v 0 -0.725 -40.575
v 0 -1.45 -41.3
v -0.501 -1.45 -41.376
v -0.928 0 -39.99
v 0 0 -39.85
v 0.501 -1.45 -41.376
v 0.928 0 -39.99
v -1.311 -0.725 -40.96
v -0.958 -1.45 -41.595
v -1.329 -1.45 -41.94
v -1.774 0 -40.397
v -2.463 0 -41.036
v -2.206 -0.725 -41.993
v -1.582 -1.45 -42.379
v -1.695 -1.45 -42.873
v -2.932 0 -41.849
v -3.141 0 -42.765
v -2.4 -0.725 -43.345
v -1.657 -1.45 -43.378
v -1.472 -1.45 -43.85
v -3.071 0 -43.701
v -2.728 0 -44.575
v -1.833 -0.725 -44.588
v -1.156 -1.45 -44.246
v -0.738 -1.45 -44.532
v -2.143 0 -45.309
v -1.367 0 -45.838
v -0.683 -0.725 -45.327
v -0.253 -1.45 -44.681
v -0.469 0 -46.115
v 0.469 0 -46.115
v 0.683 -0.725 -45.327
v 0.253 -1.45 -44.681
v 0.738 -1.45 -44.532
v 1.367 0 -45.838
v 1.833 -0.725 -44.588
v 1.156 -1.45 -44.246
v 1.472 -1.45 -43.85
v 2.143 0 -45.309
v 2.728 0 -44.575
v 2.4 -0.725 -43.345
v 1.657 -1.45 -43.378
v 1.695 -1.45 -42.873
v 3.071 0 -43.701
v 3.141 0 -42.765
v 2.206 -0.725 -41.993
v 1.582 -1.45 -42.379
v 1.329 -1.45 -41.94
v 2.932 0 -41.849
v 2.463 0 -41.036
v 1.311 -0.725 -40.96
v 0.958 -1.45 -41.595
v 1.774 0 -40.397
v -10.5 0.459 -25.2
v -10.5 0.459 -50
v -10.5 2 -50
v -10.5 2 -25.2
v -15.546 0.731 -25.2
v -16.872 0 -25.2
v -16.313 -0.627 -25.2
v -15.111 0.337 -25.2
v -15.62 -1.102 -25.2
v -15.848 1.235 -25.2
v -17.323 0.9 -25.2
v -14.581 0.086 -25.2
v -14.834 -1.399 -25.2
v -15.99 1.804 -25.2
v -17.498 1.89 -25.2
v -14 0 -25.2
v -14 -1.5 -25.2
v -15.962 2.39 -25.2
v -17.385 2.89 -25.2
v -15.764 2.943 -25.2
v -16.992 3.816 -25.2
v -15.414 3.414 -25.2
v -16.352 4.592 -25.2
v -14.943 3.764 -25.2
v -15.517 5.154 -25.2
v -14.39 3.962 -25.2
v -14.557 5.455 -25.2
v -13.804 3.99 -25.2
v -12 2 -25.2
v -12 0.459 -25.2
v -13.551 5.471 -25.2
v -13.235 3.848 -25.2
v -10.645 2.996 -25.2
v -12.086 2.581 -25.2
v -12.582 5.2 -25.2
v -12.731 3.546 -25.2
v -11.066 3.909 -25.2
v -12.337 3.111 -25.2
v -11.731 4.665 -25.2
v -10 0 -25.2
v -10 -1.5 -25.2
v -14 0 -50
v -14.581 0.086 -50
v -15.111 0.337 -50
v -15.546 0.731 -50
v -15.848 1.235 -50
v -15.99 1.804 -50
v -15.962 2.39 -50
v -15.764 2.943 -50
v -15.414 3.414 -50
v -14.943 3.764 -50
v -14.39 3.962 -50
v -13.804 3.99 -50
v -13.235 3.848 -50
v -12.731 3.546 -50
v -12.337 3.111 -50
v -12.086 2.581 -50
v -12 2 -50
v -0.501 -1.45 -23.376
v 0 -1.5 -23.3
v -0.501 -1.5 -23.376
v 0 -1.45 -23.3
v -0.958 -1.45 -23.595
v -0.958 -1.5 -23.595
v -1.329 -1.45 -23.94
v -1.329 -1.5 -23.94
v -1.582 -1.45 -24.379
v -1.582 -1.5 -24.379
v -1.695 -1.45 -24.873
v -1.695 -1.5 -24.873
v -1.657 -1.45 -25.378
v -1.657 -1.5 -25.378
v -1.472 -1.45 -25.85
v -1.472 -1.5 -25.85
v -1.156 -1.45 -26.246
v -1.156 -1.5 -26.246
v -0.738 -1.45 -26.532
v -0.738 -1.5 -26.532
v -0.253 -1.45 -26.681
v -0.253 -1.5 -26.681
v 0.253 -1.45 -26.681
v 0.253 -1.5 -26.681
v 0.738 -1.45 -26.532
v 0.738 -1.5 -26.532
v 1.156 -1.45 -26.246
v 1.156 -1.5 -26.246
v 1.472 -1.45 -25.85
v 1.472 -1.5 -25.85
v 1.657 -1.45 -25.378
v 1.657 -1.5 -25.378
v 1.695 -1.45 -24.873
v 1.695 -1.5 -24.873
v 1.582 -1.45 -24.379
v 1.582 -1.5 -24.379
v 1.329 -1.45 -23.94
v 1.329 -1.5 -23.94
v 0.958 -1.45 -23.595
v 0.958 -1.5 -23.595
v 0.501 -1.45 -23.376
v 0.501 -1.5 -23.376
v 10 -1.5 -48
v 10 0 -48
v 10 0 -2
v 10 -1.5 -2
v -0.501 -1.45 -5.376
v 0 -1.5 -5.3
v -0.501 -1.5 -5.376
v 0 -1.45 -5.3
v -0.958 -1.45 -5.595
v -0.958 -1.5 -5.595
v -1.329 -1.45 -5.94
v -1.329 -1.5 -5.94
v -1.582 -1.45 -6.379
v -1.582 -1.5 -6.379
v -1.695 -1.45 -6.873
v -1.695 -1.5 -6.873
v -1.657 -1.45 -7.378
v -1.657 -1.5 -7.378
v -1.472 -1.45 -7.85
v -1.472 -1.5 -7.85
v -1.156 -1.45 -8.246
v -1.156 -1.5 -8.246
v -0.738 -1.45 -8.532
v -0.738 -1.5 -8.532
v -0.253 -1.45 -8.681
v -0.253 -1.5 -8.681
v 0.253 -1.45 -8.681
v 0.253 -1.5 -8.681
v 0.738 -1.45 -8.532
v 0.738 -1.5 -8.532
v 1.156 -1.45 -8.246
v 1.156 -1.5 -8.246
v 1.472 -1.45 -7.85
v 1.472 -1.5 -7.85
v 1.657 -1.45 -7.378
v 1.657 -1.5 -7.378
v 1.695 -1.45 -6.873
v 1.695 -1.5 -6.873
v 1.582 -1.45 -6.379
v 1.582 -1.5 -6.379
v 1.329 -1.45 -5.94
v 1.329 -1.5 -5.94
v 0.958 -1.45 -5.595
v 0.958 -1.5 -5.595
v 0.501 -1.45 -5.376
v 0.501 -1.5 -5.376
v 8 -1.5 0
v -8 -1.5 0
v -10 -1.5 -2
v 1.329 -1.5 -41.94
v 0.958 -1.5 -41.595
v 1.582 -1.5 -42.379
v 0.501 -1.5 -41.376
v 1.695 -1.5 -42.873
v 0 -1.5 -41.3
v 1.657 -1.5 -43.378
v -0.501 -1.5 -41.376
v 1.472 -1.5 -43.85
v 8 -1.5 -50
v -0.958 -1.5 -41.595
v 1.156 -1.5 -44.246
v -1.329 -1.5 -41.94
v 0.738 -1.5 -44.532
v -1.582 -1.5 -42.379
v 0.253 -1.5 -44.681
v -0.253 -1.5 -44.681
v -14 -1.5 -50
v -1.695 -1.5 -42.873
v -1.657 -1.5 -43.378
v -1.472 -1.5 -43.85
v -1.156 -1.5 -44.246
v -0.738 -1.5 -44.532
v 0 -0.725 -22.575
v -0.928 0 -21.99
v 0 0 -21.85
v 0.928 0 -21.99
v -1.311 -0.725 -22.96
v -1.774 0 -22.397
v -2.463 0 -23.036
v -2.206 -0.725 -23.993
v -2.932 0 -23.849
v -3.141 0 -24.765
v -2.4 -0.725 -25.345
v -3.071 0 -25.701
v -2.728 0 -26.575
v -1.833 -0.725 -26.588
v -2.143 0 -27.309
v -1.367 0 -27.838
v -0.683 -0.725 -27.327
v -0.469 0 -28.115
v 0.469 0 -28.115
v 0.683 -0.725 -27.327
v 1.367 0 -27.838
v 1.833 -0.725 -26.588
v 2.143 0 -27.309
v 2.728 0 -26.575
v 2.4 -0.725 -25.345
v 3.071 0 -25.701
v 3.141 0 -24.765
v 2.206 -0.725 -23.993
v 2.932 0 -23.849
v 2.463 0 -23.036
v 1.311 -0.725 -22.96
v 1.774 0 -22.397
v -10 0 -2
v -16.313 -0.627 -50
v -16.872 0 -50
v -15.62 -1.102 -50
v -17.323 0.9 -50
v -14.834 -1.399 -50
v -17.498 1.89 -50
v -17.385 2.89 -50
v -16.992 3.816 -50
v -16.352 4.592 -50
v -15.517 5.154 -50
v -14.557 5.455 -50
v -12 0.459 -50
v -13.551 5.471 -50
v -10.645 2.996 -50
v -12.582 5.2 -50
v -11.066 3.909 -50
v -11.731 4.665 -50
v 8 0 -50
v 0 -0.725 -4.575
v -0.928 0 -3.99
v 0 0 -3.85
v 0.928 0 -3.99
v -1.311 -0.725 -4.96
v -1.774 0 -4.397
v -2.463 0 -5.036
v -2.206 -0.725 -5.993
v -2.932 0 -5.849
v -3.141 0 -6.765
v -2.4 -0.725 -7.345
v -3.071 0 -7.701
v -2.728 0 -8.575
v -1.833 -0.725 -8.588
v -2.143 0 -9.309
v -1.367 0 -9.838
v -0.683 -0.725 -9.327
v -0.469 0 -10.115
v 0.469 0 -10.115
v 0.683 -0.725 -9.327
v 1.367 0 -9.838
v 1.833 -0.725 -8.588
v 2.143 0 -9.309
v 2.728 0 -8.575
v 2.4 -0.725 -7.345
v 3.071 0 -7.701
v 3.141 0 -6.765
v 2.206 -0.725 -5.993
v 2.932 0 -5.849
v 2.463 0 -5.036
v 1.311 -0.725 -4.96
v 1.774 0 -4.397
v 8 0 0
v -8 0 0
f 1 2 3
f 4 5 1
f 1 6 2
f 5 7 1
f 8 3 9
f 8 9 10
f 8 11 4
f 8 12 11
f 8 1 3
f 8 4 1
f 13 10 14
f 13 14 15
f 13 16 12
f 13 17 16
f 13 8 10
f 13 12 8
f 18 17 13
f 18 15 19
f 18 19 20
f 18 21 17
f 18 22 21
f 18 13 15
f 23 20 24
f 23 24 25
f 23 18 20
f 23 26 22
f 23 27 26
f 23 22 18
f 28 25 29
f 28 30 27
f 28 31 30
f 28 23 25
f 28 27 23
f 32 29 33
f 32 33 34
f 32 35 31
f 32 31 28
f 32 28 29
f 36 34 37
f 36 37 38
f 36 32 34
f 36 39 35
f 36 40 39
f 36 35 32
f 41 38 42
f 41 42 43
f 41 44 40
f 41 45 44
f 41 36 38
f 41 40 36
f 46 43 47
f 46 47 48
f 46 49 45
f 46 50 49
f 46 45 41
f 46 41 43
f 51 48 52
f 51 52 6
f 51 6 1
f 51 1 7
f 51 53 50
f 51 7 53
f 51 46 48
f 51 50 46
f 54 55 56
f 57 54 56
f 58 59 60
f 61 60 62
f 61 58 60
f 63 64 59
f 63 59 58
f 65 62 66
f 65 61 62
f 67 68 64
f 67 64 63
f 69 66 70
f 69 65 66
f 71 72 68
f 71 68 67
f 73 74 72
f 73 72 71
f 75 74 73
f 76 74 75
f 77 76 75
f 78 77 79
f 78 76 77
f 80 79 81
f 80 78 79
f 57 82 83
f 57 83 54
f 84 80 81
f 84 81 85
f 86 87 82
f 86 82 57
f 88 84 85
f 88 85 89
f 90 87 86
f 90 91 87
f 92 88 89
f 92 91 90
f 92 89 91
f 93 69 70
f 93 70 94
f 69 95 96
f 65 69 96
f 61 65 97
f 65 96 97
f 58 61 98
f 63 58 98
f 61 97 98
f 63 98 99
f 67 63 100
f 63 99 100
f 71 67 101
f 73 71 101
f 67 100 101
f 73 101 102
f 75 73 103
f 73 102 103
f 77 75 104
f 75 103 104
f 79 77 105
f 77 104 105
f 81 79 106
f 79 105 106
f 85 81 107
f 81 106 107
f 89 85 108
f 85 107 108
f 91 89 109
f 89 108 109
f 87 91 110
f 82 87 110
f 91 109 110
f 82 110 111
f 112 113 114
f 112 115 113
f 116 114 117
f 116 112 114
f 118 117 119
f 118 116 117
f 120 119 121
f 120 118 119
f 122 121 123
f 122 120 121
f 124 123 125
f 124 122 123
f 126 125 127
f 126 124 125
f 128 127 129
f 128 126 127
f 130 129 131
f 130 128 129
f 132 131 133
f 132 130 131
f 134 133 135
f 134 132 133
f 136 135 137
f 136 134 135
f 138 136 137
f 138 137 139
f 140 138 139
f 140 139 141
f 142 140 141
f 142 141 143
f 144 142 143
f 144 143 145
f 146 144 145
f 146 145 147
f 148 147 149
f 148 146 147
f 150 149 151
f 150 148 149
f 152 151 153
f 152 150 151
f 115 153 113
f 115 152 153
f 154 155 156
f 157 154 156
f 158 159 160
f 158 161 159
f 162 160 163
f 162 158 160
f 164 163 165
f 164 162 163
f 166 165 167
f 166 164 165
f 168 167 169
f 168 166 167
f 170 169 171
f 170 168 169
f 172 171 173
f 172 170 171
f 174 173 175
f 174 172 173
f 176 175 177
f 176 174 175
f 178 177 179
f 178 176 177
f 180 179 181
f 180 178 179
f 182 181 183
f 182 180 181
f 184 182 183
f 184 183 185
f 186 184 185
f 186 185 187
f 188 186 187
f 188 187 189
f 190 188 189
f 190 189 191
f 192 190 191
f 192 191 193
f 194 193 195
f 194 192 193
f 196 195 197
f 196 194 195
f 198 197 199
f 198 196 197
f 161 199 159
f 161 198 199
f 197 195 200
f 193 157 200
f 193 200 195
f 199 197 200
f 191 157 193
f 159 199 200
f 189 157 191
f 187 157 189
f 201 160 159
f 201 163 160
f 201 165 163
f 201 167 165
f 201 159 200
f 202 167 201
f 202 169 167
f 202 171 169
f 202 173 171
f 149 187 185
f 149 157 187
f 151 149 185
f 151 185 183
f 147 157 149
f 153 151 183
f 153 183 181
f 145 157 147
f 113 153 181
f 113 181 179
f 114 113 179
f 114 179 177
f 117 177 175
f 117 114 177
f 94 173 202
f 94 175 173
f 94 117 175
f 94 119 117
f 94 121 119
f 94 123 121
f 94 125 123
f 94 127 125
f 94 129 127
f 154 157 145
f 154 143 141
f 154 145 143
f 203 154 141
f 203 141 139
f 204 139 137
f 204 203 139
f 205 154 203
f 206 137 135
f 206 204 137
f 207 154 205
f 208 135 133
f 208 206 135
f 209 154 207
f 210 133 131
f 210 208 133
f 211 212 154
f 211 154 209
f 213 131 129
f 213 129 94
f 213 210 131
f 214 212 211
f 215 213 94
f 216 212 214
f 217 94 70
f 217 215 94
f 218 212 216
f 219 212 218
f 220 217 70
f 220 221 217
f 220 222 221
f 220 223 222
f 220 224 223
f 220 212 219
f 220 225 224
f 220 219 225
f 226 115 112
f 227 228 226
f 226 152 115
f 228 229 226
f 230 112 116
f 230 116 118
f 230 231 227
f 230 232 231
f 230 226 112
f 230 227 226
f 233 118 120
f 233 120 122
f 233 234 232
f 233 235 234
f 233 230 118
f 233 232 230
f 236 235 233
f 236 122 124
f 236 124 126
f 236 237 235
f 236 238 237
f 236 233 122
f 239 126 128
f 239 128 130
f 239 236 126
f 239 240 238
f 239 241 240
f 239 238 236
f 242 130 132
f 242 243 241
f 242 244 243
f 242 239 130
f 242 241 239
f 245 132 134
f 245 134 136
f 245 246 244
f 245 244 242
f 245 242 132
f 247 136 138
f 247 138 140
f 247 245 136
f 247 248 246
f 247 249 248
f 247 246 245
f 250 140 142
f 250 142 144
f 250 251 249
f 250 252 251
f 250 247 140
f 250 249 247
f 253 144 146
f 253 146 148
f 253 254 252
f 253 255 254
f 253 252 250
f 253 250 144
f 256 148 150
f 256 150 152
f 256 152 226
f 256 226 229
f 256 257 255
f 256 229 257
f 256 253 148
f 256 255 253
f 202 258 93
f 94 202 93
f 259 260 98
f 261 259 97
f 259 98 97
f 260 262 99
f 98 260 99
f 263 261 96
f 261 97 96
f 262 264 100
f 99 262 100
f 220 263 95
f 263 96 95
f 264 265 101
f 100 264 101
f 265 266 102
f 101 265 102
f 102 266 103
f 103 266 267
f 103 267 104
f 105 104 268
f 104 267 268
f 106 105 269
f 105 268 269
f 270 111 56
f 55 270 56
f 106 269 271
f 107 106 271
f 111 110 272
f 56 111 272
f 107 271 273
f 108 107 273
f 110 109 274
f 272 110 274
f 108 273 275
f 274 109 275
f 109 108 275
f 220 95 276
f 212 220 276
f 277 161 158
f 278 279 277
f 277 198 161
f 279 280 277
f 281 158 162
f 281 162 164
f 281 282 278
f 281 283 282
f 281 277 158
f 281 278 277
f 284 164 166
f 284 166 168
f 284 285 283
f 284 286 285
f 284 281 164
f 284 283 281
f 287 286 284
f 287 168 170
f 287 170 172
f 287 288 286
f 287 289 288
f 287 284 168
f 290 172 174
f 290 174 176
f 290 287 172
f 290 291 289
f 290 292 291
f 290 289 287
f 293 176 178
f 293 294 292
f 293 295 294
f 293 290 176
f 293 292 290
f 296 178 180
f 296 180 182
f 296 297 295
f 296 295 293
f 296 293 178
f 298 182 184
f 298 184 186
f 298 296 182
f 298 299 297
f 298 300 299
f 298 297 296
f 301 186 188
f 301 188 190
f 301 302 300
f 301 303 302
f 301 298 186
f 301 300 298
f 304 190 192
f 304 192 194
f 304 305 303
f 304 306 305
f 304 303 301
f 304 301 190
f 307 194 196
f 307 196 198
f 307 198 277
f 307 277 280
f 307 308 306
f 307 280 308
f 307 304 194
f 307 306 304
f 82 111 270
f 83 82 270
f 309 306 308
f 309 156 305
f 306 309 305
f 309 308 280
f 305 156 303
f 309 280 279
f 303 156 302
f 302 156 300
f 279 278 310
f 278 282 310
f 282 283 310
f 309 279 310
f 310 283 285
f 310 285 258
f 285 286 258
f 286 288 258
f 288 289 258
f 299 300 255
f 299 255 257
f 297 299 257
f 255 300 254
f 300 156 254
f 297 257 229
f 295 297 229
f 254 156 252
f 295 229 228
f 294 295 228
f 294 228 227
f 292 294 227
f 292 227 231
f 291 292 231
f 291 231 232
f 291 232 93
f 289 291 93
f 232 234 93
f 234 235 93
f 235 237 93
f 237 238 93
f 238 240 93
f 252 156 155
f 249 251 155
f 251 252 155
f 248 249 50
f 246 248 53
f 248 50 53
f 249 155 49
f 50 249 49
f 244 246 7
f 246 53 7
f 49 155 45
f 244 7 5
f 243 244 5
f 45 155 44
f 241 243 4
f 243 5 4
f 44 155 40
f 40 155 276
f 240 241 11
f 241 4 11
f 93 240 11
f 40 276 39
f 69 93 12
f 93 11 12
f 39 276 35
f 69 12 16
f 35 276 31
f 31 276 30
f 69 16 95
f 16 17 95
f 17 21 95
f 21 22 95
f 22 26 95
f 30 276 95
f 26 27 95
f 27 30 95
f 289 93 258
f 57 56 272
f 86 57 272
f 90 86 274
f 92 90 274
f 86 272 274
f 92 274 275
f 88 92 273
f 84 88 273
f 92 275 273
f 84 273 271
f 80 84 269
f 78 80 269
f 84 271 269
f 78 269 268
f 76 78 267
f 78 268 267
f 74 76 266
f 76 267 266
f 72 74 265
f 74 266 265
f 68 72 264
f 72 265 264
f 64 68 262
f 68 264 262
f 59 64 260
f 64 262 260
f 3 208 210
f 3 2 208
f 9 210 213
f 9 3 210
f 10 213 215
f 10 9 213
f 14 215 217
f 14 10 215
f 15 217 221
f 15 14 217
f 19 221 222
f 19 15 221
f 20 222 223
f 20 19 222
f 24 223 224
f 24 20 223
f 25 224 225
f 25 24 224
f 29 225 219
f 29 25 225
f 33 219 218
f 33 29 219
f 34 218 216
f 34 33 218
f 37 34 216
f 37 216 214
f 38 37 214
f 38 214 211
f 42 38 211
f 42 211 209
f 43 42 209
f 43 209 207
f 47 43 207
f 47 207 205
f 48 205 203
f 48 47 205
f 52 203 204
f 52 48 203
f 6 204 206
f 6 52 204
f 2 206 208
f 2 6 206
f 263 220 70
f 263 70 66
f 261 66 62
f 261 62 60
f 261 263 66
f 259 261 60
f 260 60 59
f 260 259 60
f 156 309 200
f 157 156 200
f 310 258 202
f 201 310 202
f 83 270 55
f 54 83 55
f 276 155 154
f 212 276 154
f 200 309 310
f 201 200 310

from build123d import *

# Parameters (mm, degrees)
BASE_FLANGE1_DEPTH                           = 1.5
CHAMFER1_SIZE                                = 2
CSK_FOR_M3_COUNTERSUNK_FLAT_HEAD_SCR_2_COUNT = 2
CSK_FOR_M3_COUNTERSUNK_FLAT_HEAD_SCR_2_PITCH = 18
CSK_FOR_M3_COUNTERSUNK_FLAT_HEAD_SCR_3_COUNT = 2
CSK_FOR_M3_COUNTERSUNK_FLAT_HEAD_SCR_3_PITCH = 36
SKETCHED_START                               = -50
SKETCHED_BEND1_DEPTH                         = 24.8
SKETCHED_BEND1_2_DEPTH                       = 24.8


# Read off the part's stored shape, not the designer's step: Sketched Bend1
# Sheet-metal steps are written as plain solids
with BuildPart() as part:
    # Sketch1 → Base-Flange1 (new body)
    with BuildSketch(Plane(origin=(0, 0, 0), x_dir=(1, 0, 0), z_dir=(0, 1, 0))):
        Polygon((-28.5, 50), (10, 50), (10, 0), (-10, 0), (-10, 25.2), (-28.5, 25.2), align=None)
    extrude(amount=-BASE_FLANGE1_DEPTH)

    # Chamfer1
    chamfer1_edges = [part.edges().sort_by_distance(p)[0] for p in [
        (10, -0.75, 0),
        (-10, -0.75, 0),
        (10, -0.75, -50),
    ]]
    chamfer(chamfer1_edges, length=CHAMFER1_SIZE)

    # Sketch7 → CSK for M3 Countersunk Flat Head Screw1 (revolve, cut)
    with BuildSketch(Plane(origin=(0, 0, -43), x_dir=(0, 0, 1), z_dir=(1, 0, 0))):
        Polygon((0, 0), (0, 1.5), (1.7, 1.5), (1.7, 1.45), (3.15, 0), align=None)
    csk_for_m3_countersunk_flat_head_screw1 = revolve(axis=Axis((0, 6.35, -43), (0, -1, 0)), mode=Mode.SUBTRACT)

    # CSK for M3 Countersunk Flat Head Scr 2: CSK for M3 Countersunk Flat Head Screw1 ×2
    with Locations(*[(0, 0, i * CSK_FOR_M3_COUNTERSUNK_FLAT_HEAD_SCR_2_PITCH) for i in range(1, CSK_FOR_M3_COUNTERSUNK_FLAT_HEAD_SCR_2_COUNT)]):
        add(csk_for_m3_countersunk_flat_head_screw1, mode=Mode.SUBTRACT)

    # CSK for M3 Countersunk Flat Head Scr 3: CSK for M3 Countersunk Flat Head Screw1 ×2
    with Locations(*[(0, 0, i * CSK_FOR_M3_COUNTERSUNK_FLAT_HEAD_SCR_3_PITCH) for i in range(1, CSK_FOR_M3_COUNTERSUNK_FLAT_HEAD_SCR_3_COUNT)]):
        add(csk_for_m3_countersunk_flat_head_screw1, mode=Mode.SUBTRACT)

    # Sketched Bend1 outline → Sketched Bend1 (cut)
    with BuildSketch(Plane.XY.offset(SKETCHED_START)):
        with BuildLine():
            ThreePointArc((-14, -1.5), (-15.620185175, -1.102418411), (-16.872281323, 0))
            Line((-16.872281323, 0), (-28.5, 0))
            Line((-28.5, 0), (-28.5, -1.5))
            Line((-28.5, -1.5), (-14, -1.5))
        make_face()
    extrude(amount=SKETCHED_BEND1_DEPTH, mode=Mode.SUBTRACT)

    # Sketched Bend1 2 outline → Sketched Bend1 2 (add)
    with BuildSketch(Plane.XY.offset(SKETCHED_START)):
        with BuildLine():
            Line((-10.5, 0.459069696), (-10.5, 2))
            ThreePointArc((-10.5, 2), (-15.048097173, 5.33938502), (-16.872281323, 0))
            Line((-16.872281323, 0), (-14, 0))
            ThreePointArc((-14, 0), (-15.414213562, 3.414213562), (-12, 2))
            Line((-12, 2), (-12, 0.459069696))
            Line((-12, 0.459069696), (-10.5, 0.459069696))
        make_face()
    extrude(amount=SKETCHED_BEND1_2_DEPTH)


solid = part.part
